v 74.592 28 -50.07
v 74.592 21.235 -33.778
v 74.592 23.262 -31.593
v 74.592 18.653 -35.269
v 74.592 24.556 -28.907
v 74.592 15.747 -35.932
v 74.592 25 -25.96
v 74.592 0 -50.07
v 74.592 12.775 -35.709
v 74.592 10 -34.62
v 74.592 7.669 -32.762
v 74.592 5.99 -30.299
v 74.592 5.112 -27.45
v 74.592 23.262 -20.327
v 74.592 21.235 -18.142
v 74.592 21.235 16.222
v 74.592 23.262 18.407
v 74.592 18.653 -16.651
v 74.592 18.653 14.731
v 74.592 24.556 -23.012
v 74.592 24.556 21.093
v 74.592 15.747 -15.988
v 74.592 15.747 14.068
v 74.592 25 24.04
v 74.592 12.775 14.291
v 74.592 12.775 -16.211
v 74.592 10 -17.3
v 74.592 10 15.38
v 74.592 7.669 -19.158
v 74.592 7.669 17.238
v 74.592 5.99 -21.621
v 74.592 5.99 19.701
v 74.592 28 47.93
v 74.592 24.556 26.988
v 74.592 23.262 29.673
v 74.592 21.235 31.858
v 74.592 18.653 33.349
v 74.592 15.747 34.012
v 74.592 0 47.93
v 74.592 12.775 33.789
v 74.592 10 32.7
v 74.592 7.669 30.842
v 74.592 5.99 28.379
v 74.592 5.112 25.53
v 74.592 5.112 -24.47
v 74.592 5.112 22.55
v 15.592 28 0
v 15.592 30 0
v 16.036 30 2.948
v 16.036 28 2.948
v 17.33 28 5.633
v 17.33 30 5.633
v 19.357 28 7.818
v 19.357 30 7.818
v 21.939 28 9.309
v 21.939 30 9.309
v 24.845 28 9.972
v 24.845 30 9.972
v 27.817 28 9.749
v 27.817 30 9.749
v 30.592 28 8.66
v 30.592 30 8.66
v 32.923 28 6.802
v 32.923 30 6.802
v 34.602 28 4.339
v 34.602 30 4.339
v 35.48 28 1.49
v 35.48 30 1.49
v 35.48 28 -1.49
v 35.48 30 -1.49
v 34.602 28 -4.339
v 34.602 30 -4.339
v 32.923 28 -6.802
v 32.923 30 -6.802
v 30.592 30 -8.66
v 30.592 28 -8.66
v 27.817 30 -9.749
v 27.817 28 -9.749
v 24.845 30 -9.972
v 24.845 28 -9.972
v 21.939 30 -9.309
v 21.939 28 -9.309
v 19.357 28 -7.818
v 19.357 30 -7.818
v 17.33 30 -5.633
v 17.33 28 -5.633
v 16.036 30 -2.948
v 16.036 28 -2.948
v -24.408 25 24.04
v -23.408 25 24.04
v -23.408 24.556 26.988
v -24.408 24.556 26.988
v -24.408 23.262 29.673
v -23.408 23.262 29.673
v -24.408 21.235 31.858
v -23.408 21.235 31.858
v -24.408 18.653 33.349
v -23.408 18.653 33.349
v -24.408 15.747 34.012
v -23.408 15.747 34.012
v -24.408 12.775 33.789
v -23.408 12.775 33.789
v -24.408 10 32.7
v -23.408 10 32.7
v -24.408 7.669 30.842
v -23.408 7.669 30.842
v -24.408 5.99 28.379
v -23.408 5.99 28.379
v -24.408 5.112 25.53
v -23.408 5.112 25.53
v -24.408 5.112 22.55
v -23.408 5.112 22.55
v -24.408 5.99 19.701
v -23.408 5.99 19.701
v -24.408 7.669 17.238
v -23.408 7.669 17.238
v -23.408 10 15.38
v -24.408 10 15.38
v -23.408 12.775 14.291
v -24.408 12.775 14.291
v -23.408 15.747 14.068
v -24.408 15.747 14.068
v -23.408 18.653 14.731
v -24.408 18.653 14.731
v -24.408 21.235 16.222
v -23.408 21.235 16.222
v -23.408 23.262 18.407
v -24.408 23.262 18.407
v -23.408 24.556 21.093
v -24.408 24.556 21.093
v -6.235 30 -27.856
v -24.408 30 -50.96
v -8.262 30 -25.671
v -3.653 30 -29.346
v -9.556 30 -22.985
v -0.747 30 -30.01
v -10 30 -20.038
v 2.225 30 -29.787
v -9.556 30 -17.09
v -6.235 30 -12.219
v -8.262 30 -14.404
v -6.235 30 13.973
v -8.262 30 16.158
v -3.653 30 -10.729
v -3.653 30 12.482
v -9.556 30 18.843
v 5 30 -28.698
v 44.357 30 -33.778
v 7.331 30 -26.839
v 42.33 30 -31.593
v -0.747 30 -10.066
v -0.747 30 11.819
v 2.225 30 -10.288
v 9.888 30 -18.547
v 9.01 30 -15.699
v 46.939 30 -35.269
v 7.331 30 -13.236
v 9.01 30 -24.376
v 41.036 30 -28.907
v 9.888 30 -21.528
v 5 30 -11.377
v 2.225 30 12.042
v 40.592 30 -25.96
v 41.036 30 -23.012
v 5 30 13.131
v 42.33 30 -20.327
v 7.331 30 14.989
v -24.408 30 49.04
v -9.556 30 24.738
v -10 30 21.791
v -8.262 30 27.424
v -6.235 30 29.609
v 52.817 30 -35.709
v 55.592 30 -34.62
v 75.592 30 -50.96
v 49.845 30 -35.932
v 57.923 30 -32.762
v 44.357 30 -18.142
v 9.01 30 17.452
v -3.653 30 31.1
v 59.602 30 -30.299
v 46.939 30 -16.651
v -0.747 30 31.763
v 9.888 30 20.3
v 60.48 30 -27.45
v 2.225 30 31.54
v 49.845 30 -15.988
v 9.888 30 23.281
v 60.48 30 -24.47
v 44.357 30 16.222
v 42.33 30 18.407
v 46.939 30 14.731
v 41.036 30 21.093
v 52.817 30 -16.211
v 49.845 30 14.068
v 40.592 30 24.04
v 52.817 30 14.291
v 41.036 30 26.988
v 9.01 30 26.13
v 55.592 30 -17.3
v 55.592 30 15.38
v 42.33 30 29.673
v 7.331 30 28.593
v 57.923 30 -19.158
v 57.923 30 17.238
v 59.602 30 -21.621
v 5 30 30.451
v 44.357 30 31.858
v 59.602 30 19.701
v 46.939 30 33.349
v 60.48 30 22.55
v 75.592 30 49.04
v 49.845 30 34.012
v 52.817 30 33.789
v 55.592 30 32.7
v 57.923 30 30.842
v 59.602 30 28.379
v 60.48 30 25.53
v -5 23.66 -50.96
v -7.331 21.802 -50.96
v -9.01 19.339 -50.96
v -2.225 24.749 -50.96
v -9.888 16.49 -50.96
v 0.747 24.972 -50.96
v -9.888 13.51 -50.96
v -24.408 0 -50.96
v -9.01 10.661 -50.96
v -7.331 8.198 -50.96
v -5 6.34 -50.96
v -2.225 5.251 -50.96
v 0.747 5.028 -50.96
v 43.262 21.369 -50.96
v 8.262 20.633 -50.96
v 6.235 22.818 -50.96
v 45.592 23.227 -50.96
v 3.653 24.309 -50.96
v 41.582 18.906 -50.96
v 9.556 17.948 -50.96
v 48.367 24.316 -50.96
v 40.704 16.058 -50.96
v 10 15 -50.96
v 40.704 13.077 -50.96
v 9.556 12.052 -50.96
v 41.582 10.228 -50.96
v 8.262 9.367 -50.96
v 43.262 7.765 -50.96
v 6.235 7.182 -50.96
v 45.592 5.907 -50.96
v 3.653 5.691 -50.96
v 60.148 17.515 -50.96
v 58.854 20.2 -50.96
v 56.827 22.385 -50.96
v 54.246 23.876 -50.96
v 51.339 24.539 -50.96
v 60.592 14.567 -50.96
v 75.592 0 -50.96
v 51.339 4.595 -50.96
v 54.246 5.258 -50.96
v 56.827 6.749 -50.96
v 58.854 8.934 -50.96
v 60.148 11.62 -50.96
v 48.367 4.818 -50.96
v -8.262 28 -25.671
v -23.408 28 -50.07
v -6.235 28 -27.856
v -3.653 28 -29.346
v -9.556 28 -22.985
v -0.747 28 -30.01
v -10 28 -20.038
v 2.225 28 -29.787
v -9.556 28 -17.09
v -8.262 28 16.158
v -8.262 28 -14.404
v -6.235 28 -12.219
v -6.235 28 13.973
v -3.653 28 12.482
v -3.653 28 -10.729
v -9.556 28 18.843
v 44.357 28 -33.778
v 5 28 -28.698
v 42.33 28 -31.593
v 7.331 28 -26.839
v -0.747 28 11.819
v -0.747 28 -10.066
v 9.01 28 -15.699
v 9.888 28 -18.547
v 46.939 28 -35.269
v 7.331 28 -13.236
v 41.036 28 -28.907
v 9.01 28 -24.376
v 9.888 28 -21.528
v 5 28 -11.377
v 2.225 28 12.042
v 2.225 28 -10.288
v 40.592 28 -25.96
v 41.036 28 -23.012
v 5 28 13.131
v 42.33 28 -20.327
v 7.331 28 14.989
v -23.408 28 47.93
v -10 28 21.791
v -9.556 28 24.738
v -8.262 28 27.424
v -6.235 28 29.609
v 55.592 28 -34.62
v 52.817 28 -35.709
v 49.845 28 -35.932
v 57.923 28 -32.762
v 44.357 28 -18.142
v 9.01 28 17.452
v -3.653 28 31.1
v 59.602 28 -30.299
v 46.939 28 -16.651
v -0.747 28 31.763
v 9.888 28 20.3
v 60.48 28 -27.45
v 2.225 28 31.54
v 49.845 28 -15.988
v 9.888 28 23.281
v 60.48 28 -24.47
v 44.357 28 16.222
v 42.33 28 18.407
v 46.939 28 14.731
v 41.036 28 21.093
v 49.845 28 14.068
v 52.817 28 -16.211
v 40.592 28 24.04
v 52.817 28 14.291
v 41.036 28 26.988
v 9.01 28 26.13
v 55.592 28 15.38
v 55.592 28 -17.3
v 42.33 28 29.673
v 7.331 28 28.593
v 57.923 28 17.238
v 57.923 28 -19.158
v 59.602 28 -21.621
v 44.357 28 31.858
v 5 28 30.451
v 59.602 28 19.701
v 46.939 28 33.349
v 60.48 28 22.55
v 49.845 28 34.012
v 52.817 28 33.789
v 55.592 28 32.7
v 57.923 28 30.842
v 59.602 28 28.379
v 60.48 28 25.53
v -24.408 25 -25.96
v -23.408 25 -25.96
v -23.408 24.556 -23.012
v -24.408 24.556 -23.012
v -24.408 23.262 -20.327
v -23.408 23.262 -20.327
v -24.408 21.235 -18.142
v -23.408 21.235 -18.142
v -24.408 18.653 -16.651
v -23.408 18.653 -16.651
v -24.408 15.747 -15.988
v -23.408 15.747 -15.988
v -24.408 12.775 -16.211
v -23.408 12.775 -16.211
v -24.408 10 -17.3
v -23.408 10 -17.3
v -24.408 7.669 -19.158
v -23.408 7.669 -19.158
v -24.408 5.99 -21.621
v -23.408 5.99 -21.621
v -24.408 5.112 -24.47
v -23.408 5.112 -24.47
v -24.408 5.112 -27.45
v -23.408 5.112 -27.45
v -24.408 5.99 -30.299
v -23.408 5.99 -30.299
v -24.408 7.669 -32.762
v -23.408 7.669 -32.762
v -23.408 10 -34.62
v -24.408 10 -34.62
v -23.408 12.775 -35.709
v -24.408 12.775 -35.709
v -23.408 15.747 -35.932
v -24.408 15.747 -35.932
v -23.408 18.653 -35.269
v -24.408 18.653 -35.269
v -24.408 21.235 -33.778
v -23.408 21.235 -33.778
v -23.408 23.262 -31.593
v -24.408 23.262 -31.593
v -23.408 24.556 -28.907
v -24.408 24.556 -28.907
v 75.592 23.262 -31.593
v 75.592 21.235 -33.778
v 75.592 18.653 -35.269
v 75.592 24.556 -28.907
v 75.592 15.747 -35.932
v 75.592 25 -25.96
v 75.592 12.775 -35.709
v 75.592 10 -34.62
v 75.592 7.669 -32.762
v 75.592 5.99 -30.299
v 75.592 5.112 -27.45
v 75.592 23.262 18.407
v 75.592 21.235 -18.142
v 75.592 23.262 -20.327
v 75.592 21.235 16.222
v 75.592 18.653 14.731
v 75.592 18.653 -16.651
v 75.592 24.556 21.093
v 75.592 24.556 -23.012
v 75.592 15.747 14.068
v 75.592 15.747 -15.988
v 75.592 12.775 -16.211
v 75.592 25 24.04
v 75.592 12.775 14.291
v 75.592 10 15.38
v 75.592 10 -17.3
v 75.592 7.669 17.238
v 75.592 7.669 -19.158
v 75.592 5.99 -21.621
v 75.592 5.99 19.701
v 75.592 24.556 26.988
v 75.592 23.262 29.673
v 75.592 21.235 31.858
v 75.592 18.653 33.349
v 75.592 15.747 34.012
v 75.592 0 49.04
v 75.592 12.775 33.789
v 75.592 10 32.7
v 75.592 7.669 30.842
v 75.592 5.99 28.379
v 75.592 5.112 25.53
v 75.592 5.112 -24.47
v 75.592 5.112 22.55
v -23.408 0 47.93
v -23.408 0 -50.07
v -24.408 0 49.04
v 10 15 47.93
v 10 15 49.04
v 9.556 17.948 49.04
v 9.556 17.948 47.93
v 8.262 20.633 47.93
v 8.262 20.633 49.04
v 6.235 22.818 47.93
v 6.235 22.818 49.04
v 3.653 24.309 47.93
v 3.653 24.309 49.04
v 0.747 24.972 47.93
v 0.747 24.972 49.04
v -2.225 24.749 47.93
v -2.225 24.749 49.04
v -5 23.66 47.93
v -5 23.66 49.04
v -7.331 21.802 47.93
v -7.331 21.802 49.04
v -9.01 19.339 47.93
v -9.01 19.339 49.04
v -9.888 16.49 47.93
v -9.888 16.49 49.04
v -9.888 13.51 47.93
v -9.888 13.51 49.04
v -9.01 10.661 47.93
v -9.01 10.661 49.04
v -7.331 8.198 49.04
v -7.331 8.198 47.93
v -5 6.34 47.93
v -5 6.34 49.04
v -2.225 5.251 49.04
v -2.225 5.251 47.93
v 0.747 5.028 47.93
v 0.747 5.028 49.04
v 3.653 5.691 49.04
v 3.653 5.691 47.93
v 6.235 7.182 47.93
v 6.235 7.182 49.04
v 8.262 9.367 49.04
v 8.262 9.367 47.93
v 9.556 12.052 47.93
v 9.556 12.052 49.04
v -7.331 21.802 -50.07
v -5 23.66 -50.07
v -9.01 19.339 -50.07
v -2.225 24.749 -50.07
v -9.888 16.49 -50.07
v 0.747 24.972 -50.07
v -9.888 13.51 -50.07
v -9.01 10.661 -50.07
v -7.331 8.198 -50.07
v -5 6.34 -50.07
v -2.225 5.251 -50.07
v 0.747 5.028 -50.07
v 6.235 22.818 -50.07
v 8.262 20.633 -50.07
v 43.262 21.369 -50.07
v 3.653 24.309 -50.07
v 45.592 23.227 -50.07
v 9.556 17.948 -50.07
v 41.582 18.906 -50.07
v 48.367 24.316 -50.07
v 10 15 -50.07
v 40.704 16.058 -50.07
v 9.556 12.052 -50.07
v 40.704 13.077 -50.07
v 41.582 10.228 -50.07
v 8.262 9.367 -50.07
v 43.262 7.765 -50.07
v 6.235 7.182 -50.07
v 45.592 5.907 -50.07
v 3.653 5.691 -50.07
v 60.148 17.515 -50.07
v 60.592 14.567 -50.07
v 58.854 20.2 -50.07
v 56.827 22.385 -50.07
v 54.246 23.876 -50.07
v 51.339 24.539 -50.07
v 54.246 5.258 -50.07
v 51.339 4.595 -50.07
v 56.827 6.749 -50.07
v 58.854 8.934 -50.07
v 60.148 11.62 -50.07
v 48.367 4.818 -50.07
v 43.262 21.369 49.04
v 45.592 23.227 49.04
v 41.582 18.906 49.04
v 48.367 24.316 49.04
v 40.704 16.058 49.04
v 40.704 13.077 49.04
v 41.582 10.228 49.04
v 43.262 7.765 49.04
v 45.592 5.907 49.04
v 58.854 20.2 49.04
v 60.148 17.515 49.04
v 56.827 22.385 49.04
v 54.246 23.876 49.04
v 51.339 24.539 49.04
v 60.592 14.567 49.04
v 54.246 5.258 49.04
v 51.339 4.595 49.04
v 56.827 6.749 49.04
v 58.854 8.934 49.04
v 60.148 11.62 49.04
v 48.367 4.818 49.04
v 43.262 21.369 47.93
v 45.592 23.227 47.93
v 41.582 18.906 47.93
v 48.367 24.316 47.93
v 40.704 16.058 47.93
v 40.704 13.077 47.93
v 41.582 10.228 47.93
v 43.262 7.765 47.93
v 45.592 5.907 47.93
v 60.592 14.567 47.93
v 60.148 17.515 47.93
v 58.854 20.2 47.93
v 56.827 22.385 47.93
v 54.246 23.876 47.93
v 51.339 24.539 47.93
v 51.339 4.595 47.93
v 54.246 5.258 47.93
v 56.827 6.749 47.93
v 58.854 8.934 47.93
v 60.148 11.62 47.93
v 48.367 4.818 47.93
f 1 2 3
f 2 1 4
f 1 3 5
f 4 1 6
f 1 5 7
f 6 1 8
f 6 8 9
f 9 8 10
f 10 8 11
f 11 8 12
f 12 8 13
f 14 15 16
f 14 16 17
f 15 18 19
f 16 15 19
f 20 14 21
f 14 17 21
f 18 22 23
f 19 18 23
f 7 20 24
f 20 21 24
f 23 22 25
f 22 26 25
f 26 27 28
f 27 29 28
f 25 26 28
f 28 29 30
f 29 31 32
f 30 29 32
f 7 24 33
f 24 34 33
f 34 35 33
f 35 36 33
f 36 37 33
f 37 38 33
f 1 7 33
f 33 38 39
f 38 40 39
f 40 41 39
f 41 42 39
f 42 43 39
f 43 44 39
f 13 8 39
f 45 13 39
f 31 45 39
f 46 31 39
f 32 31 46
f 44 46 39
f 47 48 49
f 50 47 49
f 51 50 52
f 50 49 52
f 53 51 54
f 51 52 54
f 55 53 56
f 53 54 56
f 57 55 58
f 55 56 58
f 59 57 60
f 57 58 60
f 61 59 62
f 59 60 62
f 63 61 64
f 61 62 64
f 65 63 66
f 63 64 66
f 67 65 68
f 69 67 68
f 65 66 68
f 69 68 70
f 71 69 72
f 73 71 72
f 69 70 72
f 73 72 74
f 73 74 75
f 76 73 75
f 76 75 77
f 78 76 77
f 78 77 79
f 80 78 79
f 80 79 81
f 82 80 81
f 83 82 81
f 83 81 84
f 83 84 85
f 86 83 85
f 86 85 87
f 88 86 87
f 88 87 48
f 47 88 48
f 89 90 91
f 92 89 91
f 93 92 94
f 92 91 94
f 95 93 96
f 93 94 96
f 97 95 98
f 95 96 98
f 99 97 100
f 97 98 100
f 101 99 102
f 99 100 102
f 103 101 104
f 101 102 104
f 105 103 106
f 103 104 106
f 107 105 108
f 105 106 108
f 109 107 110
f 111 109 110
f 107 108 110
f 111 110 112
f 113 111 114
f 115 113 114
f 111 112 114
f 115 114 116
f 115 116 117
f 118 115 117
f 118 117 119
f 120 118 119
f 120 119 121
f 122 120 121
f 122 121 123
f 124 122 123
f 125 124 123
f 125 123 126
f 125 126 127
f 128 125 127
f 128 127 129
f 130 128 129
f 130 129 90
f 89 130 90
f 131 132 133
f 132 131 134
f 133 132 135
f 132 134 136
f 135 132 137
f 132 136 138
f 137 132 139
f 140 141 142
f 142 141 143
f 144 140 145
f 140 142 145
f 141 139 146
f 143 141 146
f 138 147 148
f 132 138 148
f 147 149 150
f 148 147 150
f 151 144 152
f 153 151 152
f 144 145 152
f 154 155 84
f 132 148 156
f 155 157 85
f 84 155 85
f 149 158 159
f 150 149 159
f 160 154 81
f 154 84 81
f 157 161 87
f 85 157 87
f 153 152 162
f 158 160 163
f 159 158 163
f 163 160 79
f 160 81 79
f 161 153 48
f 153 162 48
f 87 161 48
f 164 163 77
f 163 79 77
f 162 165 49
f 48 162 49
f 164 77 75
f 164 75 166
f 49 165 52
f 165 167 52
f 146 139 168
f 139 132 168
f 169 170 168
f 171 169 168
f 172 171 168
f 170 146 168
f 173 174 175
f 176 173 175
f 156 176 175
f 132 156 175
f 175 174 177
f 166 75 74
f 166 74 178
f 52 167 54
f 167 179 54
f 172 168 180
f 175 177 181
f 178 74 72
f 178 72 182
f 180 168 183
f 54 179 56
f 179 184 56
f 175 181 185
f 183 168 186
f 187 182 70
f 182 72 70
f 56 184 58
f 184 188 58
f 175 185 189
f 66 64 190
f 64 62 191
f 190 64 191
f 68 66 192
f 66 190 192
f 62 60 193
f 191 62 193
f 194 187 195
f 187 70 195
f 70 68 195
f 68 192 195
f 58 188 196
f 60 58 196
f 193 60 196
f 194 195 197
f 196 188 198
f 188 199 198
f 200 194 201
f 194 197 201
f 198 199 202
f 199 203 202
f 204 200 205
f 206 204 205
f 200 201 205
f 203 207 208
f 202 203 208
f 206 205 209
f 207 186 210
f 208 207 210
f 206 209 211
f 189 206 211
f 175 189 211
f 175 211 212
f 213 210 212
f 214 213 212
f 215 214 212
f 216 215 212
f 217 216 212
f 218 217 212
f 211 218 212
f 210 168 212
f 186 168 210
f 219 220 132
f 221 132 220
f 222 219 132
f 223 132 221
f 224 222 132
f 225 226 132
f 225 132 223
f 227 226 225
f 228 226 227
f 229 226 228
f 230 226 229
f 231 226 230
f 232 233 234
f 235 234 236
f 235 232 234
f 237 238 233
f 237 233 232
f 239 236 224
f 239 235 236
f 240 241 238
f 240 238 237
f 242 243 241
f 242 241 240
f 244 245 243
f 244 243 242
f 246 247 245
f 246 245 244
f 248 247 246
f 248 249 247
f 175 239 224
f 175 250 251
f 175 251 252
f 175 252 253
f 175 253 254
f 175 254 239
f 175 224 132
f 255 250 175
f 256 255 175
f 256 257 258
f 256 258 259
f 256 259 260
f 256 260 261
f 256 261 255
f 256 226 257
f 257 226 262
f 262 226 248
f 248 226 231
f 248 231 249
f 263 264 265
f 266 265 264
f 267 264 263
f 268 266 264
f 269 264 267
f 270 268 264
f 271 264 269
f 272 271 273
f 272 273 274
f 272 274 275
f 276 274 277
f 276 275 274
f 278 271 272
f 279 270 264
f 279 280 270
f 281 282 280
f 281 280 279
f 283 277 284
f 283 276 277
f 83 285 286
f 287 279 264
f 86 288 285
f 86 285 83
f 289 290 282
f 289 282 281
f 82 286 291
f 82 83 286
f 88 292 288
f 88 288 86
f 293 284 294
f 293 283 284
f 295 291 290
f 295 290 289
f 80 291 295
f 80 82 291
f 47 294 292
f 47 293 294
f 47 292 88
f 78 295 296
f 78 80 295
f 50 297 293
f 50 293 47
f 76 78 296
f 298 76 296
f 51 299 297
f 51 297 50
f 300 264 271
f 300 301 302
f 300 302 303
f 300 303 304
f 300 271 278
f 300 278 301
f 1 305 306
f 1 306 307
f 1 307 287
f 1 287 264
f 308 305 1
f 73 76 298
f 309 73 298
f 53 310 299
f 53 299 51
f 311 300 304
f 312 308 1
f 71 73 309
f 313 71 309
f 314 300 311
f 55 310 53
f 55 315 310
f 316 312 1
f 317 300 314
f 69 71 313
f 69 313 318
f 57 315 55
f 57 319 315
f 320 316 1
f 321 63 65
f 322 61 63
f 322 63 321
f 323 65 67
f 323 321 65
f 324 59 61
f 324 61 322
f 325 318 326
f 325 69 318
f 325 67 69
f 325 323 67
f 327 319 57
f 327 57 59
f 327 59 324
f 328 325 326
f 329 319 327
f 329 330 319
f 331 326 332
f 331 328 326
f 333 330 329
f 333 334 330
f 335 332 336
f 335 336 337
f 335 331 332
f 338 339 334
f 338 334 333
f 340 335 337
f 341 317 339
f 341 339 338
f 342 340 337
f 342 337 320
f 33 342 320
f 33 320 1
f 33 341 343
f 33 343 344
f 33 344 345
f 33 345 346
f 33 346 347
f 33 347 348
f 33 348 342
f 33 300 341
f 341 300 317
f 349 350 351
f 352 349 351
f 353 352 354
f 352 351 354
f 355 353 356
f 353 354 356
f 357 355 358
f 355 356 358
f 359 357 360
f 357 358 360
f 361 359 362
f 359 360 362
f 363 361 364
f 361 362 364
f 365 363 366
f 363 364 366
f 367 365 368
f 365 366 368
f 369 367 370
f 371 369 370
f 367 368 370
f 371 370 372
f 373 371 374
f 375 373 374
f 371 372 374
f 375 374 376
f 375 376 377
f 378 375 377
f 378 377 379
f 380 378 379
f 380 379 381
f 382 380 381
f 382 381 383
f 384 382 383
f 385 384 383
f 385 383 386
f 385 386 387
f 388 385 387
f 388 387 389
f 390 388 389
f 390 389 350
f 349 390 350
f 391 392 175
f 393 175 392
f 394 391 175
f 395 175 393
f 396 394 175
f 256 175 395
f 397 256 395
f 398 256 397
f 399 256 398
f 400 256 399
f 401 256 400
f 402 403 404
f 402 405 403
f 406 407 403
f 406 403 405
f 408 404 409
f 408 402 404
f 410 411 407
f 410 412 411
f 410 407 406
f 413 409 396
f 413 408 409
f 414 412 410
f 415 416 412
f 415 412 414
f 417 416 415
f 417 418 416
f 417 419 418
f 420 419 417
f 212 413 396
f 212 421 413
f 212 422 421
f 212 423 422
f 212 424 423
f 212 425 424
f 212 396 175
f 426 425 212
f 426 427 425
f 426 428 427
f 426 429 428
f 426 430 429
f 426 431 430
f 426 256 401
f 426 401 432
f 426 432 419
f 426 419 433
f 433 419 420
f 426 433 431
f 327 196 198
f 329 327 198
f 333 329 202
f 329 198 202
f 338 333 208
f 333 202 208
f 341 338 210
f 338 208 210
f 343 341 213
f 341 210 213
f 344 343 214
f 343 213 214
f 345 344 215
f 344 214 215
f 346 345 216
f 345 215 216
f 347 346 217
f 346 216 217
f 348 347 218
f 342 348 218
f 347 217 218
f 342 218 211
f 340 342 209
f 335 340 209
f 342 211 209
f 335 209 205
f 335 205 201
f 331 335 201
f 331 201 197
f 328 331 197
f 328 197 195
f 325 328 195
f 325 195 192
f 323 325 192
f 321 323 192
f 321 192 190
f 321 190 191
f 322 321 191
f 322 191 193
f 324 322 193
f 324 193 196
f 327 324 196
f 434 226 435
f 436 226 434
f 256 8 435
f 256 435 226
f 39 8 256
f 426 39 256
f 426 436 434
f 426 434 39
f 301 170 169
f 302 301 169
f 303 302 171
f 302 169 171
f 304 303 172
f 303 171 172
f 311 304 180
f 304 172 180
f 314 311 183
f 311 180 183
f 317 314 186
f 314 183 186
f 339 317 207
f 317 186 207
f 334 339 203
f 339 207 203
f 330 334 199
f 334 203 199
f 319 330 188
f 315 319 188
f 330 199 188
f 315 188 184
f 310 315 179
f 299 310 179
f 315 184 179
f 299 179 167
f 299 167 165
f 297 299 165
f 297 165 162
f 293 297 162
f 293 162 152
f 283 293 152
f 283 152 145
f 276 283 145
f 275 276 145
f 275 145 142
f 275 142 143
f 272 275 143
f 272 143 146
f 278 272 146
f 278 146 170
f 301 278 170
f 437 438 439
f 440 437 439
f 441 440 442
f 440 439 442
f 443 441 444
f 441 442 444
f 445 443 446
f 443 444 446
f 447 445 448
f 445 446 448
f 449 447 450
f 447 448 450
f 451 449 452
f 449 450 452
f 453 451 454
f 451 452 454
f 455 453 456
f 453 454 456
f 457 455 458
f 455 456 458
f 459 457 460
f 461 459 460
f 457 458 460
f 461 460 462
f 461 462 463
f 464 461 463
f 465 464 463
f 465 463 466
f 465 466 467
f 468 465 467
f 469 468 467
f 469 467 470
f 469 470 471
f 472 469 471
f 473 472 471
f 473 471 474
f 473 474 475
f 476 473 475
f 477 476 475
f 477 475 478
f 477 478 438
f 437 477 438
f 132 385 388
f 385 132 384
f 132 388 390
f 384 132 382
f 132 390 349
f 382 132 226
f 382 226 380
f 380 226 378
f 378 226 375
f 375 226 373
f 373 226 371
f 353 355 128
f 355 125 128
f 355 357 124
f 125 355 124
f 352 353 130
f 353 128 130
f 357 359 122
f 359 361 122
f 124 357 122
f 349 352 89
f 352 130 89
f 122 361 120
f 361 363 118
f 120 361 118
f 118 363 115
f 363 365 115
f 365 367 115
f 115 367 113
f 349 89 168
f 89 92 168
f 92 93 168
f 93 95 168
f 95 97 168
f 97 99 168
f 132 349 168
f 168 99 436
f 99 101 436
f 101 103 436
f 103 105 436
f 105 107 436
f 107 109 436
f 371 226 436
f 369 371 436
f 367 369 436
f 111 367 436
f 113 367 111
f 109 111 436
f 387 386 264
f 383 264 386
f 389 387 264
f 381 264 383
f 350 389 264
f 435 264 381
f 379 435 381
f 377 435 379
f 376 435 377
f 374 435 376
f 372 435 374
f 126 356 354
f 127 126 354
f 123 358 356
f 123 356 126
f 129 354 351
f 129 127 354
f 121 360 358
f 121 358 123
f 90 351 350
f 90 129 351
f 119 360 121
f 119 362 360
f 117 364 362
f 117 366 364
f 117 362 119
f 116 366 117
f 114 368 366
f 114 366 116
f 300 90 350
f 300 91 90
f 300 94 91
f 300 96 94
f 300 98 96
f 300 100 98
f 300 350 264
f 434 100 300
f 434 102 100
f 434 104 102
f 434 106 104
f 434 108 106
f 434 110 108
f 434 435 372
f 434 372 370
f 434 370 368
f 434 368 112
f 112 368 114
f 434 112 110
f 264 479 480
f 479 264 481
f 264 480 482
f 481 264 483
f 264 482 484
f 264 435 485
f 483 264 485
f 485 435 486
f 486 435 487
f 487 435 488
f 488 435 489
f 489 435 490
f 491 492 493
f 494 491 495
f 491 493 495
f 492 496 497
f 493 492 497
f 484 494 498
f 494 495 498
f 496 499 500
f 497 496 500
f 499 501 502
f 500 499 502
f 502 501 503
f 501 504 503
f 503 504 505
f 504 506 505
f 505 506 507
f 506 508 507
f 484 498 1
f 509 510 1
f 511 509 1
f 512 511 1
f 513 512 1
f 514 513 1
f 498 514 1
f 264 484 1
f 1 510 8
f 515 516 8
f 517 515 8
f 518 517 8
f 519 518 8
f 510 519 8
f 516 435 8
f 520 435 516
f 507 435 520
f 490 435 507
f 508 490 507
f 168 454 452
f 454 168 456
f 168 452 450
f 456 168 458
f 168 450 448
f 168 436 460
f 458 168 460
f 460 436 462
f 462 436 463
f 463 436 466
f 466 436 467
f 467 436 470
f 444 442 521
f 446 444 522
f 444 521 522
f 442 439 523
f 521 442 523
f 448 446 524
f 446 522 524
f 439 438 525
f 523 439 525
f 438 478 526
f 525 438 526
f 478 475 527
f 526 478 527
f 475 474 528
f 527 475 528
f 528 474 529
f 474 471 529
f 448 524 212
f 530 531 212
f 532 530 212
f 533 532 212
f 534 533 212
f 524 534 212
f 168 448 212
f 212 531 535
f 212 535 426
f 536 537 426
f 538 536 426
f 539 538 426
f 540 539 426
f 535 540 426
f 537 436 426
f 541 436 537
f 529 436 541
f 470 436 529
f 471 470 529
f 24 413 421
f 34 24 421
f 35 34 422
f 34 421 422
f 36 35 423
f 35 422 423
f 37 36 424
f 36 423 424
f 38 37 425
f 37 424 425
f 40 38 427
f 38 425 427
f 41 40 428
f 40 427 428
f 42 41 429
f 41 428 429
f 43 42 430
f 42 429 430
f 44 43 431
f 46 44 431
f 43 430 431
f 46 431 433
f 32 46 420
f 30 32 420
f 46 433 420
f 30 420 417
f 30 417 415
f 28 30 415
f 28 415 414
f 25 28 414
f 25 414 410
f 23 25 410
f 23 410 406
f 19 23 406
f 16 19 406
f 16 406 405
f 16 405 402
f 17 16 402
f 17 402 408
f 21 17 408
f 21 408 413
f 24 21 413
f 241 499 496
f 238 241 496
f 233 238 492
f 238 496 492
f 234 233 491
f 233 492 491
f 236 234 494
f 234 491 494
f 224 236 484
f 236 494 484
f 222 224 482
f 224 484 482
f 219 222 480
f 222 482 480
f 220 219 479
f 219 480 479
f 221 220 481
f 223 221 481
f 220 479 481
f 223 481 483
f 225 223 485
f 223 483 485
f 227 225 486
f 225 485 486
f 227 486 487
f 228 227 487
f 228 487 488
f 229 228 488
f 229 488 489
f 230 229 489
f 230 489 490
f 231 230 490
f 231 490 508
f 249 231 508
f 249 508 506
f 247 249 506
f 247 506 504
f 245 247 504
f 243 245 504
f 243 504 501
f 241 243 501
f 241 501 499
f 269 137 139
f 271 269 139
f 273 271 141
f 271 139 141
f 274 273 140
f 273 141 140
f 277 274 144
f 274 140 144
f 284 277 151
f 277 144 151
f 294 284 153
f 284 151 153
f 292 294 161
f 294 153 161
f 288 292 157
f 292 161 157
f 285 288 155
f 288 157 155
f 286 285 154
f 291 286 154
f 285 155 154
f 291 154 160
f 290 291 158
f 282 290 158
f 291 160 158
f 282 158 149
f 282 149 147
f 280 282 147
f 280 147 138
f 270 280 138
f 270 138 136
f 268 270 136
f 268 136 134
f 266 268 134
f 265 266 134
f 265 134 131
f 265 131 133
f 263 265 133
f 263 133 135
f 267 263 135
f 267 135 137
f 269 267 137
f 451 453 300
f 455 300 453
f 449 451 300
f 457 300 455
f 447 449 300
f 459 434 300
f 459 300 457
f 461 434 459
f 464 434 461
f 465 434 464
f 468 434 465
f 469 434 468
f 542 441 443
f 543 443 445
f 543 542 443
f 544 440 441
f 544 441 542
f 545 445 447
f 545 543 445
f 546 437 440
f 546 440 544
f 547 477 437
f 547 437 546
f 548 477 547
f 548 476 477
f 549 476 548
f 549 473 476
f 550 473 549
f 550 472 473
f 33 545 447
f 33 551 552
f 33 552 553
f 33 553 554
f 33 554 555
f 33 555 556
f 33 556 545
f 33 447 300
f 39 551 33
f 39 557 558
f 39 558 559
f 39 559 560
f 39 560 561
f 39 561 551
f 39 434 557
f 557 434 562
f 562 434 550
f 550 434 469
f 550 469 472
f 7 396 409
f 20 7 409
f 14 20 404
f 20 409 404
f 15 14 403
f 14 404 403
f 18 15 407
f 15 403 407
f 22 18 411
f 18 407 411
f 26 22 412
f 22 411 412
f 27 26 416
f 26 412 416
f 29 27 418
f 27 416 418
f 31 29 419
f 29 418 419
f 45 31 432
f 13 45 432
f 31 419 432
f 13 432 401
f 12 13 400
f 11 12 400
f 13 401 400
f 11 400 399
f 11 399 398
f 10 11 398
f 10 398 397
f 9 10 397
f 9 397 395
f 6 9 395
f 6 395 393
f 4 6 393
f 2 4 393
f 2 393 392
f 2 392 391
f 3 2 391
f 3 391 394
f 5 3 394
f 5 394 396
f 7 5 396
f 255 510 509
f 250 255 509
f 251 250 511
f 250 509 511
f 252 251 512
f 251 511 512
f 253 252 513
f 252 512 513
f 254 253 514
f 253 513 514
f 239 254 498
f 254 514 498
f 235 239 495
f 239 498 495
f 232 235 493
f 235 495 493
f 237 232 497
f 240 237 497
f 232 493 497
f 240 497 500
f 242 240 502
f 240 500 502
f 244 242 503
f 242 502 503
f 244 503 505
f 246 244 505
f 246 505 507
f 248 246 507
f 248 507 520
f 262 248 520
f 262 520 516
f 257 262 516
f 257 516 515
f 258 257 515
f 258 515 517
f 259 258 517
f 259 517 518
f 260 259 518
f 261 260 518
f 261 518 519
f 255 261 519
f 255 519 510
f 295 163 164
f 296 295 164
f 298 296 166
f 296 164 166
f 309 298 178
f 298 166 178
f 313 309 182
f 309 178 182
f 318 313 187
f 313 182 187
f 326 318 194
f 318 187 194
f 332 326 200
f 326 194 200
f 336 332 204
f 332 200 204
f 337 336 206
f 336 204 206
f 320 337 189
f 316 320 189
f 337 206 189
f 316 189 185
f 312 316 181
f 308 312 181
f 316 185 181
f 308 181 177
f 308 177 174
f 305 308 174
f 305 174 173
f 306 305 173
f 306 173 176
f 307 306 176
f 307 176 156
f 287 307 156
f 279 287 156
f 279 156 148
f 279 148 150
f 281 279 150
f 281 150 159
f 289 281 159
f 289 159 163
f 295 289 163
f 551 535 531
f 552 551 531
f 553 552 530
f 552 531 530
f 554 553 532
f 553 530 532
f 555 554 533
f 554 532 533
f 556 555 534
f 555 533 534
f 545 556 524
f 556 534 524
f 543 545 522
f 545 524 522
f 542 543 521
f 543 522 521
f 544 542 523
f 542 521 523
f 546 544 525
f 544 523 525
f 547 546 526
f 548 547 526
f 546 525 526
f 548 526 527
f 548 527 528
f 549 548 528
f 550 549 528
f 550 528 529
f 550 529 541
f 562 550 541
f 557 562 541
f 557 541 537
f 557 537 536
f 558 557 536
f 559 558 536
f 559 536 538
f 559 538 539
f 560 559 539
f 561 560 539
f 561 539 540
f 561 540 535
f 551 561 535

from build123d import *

# Parameters (mm, degrees)
F0_W     = 100
F0_H     = 100
F1_DEPTH = 30
F2_R     = 10
F3_DEPTH = 100
F4_R     = 10
F5_DEPTH = 100
F6_W     = 98
F6_H     = 98
F7_DEPTH = 28
F8_R     = 10
F9_DEPTH = 3


# Not quite as in the source:
# - a feature names something its author has since deleted; it is built from what else it names


with BuildPart() as f1:
    # F0 (on Front) → F1 (new body)
    with BuildSketch(Plane.XZ):
        with Locations((25.5921050906, -0.9599315155)):
            Rectangle(F0_W, F0_H)
    extrude(amount=-F1_DEPTH)

    # F2 (on face) → F3 (cut)
    with BuildSketch(Plane.YZ.offset(75.5921050906)):
        with Locations((15, 24.0400684845)):
            Circle(F2_R)
        with Locations((15, -25.9599315155)):
            Circle(F2_R)
    extrude(amount=-F3_DEPTH, mode=Mode.SUBTRACT)

    # F4 (on face) → F5 (cut)
    with BuildSketch(Plane.XY.offset(49.0400684845)):
        with Locations((0, 15)):
            Circle(F4_R)
        with Locations((50.5921050906, 14.5671376958)):
            Circle(F4_R)
    extrude(amount=-F5_DEPTH, mode=Mode.SUBTRACT)

    # F6 (on face) → F7 (cut)
    with BuildSketch(Plane.XZ):
        with Locations((25.5921050906, -1.0704044253)):
            Rectangle(F6_W, F6_H)
    extrude(amount=-F7_DEPTH, mode=Mode.SUBTRACT)

    # F8 (on face) → F9 (cut)
    with BuildSketch(Plane(origin=(0, 30, 0), x_dir=(-1, 0, 0), z_dir=(0, 1, 0))):
        with Locations((0, -20.037606527)):
            Circle(F8_R)
        with Locations((0, 21.7908981225)):
            Circle(F8_R)
        with Locations((-25.5921050906, 0)):
            Circle(F8_R)
        with Locations((-50.5921050906, 24.0400684845)):
            Circle(F8_R)
        with Locations((-50.5921050906, -25.9599315155)):
            Circle(F8_R)
    extrude(amount=-F9_DEPTH, mode=Mode.SUBTRACT)


solid = f1.part
